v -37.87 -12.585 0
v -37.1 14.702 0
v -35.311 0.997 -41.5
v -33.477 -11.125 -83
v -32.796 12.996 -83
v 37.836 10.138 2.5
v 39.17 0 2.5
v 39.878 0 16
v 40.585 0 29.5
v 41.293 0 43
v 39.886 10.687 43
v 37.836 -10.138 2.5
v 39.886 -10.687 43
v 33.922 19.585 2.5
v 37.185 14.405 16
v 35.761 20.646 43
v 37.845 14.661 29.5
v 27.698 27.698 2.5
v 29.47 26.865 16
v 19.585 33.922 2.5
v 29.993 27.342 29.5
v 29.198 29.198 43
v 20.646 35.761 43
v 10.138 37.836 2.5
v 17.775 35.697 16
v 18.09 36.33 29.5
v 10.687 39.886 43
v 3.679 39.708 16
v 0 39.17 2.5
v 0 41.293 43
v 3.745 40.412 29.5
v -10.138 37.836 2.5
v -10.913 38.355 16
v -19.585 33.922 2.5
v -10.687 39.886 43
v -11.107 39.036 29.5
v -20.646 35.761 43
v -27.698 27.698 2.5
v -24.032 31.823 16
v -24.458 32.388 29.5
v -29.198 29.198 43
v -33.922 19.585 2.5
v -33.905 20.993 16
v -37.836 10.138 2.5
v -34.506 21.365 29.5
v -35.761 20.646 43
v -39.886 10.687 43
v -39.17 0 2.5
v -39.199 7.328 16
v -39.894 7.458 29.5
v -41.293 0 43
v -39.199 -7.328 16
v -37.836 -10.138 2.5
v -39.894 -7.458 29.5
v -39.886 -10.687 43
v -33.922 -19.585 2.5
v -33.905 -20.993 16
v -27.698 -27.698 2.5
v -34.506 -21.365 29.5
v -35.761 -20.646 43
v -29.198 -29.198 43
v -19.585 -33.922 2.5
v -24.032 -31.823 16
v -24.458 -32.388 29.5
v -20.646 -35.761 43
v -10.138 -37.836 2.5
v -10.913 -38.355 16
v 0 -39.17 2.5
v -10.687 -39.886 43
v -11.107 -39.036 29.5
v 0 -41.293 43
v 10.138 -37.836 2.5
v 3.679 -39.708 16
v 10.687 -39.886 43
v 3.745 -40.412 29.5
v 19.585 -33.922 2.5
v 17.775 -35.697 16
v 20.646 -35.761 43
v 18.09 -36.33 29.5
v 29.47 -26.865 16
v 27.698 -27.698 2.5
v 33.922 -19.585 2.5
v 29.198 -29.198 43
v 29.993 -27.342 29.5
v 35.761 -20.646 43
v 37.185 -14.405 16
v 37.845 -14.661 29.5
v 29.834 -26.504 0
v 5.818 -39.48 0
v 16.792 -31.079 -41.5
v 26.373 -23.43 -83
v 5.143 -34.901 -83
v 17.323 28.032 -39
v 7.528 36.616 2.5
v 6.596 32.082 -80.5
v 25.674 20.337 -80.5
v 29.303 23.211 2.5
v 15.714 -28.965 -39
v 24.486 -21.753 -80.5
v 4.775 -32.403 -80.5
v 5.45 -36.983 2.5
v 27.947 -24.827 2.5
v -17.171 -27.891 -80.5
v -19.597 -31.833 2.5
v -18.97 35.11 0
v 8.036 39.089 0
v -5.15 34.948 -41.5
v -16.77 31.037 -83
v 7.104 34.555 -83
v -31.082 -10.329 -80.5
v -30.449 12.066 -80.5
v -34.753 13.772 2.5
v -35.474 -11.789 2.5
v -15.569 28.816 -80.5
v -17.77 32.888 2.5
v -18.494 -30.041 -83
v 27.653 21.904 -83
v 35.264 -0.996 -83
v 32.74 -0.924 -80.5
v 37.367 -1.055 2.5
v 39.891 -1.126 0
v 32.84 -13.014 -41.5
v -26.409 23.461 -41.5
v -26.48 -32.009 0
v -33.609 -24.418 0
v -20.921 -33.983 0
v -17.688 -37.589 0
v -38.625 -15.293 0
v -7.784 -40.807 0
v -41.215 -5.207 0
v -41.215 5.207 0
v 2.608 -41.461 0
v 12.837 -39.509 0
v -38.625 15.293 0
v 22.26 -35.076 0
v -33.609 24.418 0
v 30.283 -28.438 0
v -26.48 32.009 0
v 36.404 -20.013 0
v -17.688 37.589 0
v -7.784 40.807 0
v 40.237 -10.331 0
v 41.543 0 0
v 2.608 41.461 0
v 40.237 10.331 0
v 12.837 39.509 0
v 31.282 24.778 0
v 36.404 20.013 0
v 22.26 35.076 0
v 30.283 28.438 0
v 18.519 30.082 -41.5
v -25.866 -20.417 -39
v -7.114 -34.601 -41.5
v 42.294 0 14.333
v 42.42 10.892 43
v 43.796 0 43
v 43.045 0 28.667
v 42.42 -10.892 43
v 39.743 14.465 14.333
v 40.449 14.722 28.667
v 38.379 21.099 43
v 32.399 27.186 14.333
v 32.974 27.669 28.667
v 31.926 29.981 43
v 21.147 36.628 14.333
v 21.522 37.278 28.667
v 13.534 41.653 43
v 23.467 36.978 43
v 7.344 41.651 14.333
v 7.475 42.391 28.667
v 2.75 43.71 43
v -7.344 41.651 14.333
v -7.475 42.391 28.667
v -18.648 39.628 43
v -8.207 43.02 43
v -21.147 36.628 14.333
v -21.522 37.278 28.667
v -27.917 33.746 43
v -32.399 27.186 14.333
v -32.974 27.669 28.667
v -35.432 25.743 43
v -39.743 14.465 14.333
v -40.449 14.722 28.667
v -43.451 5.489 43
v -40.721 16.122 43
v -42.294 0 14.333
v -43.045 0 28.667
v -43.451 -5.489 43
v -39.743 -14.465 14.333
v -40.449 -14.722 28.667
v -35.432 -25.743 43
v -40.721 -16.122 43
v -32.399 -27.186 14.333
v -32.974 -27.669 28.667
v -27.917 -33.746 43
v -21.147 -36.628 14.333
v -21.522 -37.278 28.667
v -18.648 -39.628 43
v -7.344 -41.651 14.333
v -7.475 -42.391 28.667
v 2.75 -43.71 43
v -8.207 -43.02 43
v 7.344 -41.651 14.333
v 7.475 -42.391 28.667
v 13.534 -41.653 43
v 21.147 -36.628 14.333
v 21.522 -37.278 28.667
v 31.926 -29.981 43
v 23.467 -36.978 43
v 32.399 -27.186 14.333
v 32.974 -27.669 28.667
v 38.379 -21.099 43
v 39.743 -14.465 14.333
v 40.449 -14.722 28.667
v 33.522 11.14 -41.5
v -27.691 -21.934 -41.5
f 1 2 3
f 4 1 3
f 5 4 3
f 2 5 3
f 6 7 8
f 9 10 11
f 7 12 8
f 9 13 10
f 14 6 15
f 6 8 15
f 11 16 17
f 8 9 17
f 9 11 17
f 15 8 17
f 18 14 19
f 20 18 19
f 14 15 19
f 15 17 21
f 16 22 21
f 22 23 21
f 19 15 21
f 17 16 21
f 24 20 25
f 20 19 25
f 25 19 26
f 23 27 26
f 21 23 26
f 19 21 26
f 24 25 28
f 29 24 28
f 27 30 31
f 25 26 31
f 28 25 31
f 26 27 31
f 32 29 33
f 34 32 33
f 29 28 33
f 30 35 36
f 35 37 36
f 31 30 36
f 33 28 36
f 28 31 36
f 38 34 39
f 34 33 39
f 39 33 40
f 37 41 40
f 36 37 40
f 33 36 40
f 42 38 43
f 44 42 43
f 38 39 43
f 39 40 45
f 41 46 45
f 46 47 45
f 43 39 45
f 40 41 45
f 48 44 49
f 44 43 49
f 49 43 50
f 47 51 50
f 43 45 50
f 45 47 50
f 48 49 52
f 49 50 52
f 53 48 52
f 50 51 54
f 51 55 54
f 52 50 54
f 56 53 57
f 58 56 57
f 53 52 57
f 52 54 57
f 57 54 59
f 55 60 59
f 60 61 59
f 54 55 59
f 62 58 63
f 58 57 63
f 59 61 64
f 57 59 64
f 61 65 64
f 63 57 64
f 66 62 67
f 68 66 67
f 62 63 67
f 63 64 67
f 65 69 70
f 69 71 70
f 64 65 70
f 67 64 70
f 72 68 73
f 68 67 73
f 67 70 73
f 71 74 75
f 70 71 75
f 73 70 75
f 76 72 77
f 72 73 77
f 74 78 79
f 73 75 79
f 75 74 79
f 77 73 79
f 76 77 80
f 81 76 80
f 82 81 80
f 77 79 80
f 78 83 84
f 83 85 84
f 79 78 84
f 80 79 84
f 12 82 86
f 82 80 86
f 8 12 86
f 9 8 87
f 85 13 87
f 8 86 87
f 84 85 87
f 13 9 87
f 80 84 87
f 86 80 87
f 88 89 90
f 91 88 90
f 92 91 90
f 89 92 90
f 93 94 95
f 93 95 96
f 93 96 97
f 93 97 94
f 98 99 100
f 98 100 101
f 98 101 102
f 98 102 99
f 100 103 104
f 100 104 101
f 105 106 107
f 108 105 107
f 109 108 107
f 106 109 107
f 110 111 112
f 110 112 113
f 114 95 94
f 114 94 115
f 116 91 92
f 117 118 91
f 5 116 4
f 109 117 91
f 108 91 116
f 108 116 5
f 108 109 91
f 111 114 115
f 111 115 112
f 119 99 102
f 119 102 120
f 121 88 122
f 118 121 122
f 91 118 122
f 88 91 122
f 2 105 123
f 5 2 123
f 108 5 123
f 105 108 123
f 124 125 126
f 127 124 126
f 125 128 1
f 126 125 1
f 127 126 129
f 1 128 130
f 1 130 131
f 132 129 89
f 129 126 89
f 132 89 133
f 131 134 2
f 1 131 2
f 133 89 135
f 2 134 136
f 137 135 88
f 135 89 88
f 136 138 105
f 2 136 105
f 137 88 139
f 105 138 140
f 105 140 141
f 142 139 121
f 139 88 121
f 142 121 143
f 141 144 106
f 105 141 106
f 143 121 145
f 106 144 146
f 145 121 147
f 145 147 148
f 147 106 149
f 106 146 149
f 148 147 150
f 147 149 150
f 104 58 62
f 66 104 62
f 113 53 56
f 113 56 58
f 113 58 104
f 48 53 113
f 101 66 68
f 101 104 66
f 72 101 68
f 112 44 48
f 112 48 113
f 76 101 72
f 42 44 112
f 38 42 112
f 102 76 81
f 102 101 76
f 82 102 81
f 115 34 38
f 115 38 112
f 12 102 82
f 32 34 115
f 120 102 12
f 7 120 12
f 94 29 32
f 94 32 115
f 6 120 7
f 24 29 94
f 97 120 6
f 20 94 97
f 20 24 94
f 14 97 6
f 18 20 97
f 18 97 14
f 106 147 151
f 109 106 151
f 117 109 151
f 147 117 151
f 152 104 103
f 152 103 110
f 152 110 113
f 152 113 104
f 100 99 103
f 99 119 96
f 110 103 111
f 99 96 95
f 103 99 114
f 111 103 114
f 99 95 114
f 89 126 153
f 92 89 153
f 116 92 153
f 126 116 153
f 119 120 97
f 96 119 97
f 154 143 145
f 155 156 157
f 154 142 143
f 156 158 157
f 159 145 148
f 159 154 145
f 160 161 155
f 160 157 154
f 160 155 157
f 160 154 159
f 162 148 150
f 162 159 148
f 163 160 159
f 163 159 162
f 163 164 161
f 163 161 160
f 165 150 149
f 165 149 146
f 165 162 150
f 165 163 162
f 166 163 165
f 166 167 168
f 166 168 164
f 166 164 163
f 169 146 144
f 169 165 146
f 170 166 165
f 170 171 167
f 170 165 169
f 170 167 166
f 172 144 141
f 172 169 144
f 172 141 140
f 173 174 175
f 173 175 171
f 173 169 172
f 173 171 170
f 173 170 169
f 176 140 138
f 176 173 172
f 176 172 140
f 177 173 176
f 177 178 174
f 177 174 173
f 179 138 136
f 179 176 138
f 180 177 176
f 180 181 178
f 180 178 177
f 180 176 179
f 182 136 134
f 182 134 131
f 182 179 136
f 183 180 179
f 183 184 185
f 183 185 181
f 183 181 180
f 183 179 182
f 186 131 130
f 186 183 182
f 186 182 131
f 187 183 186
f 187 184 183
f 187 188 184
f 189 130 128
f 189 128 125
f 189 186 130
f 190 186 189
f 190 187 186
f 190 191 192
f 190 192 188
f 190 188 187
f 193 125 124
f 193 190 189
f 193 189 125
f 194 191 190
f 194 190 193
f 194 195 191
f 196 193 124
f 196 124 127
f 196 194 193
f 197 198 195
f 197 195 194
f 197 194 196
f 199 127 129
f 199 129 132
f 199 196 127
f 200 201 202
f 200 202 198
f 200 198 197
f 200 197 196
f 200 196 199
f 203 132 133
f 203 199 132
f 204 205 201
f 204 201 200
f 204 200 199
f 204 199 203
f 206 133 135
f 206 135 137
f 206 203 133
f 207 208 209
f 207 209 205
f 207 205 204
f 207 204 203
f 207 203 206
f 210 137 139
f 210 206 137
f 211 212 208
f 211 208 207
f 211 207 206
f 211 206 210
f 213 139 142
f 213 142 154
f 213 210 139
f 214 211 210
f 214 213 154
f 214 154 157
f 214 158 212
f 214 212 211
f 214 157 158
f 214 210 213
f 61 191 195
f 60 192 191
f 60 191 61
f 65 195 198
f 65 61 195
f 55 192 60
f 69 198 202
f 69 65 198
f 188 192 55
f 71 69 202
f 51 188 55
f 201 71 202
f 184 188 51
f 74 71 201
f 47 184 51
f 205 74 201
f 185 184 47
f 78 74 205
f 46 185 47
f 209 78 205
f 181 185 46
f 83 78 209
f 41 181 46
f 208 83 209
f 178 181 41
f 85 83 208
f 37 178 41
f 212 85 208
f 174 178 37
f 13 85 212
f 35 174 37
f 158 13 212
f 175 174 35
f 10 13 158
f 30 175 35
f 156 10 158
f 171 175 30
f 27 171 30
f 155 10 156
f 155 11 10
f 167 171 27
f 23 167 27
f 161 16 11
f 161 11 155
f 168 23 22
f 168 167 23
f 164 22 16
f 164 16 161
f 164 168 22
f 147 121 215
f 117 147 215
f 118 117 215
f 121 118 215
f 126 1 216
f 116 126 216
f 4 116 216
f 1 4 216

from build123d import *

# Parameters (mm, degrees)
F1_DEPTH = 83
F1_TAPER = 3
F2_R     = 41.5426365129
F3_DEPTH = 43
F3_TAPER = -3
F4_T     = -2.5


with BuildPart() as f1:
    # F0 (on Top) → F1 (new body)
    with BuildSketch(Plane.XY):
        Polygon((29.8341157565, -26.5041046934), (39.8907686935, -1.126322166), (31.2820876222, 24.7784790206), (8.0361700908, 39.0891544913), (-18.9699607381, 35.109580148), (-37.0998361101, 14.7018430539), (-37.8702858474, -12.5850497979), (-20.9208079553, -33.983257982), (5.8177484879, -39.4803220745), align=None)
    extrude(amount=-F1_DEPTH, taper=F1_TAPER)

    # F2 (on Top) → F3 (join)
    with BuildSketch(Plane.XY):
        Circle(F2_R)
    extrude(amount=F3_DEPTH, taper=F3_TAPER)

    # F4
    f4_openings = [f1.faces().sort_by_distance(p)[0] for p in [
        (0, 0, 43),
    ]]
    offset(amount=F4_T, openings=f4_openings, kind=Kind.INTERSECTION)


solid = f1.part
